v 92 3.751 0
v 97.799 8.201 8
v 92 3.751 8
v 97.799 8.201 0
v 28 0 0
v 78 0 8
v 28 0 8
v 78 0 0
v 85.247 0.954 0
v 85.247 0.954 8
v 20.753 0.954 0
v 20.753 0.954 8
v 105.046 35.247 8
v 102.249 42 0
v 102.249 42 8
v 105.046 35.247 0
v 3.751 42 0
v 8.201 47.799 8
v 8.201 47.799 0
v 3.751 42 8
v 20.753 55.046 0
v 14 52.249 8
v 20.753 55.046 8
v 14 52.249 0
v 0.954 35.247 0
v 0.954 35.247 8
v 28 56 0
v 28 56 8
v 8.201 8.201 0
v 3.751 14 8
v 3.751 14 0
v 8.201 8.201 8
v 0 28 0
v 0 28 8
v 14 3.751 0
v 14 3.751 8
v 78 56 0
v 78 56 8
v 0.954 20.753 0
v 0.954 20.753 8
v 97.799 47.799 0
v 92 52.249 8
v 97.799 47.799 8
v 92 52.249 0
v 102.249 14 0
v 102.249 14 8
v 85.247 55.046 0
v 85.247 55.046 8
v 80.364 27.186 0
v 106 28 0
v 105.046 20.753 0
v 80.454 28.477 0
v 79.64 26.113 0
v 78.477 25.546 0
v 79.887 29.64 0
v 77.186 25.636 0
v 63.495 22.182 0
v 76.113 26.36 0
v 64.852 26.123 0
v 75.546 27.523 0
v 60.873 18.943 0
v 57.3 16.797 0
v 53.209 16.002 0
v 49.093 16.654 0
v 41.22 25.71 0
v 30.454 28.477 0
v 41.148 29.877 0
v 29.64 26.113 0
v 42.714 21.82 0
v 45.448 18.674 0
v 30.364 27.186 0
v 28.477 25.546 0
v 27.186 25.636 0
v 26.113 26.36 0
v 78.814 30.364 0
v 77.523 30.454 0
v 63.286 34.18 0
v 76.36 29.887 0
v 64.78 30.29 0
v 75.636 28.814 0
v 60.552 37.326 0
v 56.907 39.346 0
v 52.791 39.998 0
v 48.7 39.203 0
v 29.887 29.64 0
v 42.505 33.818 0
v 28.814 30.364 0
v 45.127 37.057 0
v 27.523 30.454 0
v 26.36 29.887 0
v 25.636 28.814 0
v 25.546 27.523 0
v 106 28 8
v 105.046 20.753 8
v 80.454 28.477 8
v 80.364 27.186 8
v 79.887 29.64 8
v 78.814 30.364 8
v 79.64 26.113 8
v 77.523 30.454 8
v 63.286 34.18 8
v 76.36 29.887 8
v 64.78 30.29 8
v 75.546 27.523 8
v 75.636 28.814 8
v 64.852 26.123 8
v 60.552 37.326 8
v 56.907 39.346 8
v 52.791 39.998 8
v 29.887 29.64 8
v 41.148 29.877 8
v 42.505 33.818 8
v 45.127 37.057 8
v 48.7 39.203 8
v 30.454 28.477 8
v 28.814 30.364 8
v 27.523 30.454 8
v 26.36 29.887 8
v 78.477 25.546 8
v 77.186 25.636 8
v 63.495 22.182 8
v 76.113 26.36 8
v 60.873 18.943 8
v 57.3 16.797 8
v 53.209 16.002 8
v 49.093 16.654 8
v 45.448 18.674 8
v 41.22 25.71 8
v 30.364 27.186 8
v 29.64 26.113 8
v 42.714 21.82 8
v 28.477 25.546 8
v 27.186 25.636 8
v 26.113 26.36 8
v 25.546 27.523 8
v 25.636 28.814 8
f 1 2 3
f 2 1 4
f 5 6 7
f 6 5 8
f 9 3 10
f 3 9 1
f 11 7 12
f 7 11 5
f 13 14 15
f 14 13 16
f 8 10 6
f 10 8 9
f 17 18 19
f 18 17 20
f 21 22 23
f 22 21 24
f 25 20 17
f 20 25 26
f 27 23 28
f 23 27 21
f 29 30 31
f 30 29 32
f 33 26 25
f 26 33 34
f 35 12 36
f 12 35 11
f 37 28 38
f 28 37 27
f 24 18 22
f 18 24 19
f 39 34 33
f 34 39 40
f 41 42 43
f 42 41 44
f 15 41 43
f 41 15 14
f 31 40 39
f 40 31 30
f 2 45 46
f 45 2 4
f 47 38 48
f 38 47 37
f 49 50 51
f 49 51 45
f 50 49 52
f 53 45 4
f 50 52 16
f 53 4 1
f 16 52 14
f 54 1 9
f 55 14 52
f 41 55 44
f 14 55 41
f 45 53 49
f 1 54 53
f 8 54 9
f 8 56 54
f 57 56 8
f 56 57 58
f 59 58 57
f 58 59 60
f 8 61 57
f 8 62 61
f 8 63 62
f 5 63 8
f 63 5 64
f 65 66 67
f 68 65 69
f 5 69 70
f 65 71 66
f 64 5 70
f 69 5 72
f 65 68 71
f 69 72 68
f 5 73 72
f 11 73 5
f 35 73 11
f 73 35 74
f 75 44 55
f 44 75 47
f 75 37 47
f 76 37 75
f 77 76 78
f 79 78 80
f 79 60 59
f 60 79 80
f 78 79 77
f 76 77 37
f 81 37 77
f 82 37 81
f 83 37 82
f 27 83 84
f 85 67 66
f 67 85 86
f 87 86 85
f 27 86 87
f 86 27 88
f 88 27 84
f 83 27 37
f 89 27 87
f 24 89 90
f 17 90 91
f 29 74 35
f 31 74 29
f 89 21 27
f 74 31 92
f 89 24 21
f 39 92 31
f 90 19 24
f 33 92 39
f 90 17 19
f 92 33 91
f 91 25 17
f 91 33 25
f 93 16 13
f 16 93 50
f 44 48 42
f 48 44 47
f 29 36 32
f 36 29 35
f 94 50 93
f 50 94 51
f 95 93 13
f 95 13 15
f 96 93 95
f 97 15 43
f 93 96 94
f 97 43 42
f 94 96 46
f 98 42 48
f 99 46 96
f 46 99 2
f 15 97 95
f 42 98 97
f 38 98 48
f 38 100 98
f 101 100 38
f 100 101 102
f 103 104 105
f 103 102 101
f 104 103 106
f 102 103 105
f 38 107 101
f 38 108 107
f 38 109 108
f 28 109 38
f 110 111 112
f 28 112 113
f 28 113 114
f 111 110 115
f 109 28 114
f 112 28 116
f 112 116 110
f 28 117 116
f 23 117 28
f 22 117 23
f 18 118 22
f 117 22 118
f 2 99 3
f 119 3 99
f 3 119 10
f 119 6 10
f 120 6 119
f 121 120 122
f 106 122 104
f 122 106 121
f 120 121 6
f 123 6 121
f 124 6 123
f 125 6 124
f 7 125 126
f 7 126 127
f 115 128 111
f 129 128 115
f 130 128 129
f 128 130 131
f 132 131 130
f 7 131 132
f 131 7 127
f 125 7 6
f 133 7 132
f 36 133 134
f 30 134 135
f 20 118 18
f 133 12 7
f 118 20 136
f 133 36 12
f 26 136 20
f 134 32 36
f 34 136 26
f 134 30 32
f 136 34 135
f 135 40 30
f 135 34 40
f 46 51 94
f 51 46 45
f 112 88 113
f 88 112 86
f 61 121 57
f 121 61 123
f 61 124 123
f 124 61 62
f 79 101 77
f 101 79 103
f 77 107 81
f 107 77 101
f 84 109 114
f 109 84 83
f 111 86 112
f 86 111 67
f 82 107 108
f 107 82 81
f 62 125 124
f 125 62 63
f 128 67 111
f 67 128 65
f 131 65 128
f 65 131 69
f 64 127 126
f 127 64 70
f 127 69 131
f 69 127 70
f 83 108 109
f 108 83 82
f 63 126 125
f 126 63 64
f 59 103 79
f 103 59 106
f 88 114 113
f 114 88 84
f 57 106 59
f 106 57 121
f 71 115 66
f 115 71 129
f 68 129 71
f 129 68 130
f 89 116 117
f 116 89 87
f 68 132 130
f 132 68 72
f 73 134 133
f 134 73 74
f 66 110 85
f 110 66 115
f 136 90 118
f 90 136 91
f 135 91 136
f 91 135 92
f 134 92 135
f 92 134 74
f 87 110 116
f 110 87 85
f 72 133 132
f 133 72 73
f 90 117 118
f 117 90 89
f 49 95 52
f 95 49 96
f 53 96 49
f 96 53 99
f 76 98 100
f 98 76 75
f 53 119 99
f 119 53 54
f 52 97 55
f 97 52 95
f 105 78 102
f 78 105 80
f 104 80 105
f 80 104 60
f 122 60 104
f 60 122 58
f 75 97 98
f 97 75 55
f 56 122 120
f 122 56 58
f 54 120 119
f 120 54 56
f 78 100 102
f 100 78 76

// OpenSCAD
$fn = 32;

// ----------------------------------------------------------------------
// Spacer plate: obround span 50, caps R28
// ----------------------------------------------------------------------

// --- parameters (mm) ---
bore_r = 12;              // centre bore radius
bolt_r = 2.5;             // bolt hole radius
plate_t = 8;              // plate thickness, Z (extrusion height)
span = 50;                // obround span
cap_r = 28;               // cap radius

profile = [[28, 56], [20.753, 55.046], [14, 52.249], [8.201, 47.799], [3.751, 42], [0.954, 35.247], [0, 28], [0.954, 20.753], [3.751, 14], [8.201, 8.201], [14, 3.751], [20.753, 0.954], [28, 0], [78, 0], [85.247, 0.954], [92, 3.751], [97.799, 8.201], [102.249, 14], [105.046, 20.753], [106, 28], [105.046, 35.247], [102.249, 42], [97.799, 47.799], [92, 52.249], [85.247, 55.046], [78, 56]];  // primary outline, 26 points, counter clockwise
void_1 = [[64.78, 30.29], [63.286, 34.18], [60.552, 37.326], [56.907, 39.346], [52.791, 39.998], [48.7, 39.203], [45.127, 37.057], [42.505, 33.818], [41.148, 29.877], [41.22, 25.71], [42.714, 21.82], [45.448, 18.674], [49.093, 16.654], [53.209, 16.002], [57.3, 16.797], [60.873, 18.943], [63.495, 22.182], [64.852, 26.123]];  // centre bore, 18 points
void_2 = [[30.454, 28.477], [29.887, 29.64], [28.814, 30.364], [27.523, 30.454], [26.36, 29.887], [25.636, 28.814], [25.546, 27.523], [26.113, 26.36], [27.186, 25.636], [28.477, 25.546], [29.64, 26.113], [30.364, 27.186]];  // end hole, 12 points
void_3 = [[80.454, 28.477], [79.887, 29.64], [78.814, 30.364], [77.523, 30.454], [76.36, 29.887], [75.636, 28.814], [75.546, 27.523], [76.113, 26.36], [77.186, 25.636], [78.477, 25.546], [79.64, 26.113], [80.364, 27.186]];  // end hole, 12 points

// --- the one profile operation ---
difference() {
  linear_extrude(height = plate_t) polygon(points = profile);
  translate([0, 0, -1])
    linear_extrude(height = plate_t + 2) polygon(points = void_1);
  translate([0, 0, -1])
    linear_extrude(height = plate_t + 2) polygon(points = void_2);
  translate([0, 0, -1])
    linear_extrude(height = plate_t + 2) polygon(points = void_3);
}
